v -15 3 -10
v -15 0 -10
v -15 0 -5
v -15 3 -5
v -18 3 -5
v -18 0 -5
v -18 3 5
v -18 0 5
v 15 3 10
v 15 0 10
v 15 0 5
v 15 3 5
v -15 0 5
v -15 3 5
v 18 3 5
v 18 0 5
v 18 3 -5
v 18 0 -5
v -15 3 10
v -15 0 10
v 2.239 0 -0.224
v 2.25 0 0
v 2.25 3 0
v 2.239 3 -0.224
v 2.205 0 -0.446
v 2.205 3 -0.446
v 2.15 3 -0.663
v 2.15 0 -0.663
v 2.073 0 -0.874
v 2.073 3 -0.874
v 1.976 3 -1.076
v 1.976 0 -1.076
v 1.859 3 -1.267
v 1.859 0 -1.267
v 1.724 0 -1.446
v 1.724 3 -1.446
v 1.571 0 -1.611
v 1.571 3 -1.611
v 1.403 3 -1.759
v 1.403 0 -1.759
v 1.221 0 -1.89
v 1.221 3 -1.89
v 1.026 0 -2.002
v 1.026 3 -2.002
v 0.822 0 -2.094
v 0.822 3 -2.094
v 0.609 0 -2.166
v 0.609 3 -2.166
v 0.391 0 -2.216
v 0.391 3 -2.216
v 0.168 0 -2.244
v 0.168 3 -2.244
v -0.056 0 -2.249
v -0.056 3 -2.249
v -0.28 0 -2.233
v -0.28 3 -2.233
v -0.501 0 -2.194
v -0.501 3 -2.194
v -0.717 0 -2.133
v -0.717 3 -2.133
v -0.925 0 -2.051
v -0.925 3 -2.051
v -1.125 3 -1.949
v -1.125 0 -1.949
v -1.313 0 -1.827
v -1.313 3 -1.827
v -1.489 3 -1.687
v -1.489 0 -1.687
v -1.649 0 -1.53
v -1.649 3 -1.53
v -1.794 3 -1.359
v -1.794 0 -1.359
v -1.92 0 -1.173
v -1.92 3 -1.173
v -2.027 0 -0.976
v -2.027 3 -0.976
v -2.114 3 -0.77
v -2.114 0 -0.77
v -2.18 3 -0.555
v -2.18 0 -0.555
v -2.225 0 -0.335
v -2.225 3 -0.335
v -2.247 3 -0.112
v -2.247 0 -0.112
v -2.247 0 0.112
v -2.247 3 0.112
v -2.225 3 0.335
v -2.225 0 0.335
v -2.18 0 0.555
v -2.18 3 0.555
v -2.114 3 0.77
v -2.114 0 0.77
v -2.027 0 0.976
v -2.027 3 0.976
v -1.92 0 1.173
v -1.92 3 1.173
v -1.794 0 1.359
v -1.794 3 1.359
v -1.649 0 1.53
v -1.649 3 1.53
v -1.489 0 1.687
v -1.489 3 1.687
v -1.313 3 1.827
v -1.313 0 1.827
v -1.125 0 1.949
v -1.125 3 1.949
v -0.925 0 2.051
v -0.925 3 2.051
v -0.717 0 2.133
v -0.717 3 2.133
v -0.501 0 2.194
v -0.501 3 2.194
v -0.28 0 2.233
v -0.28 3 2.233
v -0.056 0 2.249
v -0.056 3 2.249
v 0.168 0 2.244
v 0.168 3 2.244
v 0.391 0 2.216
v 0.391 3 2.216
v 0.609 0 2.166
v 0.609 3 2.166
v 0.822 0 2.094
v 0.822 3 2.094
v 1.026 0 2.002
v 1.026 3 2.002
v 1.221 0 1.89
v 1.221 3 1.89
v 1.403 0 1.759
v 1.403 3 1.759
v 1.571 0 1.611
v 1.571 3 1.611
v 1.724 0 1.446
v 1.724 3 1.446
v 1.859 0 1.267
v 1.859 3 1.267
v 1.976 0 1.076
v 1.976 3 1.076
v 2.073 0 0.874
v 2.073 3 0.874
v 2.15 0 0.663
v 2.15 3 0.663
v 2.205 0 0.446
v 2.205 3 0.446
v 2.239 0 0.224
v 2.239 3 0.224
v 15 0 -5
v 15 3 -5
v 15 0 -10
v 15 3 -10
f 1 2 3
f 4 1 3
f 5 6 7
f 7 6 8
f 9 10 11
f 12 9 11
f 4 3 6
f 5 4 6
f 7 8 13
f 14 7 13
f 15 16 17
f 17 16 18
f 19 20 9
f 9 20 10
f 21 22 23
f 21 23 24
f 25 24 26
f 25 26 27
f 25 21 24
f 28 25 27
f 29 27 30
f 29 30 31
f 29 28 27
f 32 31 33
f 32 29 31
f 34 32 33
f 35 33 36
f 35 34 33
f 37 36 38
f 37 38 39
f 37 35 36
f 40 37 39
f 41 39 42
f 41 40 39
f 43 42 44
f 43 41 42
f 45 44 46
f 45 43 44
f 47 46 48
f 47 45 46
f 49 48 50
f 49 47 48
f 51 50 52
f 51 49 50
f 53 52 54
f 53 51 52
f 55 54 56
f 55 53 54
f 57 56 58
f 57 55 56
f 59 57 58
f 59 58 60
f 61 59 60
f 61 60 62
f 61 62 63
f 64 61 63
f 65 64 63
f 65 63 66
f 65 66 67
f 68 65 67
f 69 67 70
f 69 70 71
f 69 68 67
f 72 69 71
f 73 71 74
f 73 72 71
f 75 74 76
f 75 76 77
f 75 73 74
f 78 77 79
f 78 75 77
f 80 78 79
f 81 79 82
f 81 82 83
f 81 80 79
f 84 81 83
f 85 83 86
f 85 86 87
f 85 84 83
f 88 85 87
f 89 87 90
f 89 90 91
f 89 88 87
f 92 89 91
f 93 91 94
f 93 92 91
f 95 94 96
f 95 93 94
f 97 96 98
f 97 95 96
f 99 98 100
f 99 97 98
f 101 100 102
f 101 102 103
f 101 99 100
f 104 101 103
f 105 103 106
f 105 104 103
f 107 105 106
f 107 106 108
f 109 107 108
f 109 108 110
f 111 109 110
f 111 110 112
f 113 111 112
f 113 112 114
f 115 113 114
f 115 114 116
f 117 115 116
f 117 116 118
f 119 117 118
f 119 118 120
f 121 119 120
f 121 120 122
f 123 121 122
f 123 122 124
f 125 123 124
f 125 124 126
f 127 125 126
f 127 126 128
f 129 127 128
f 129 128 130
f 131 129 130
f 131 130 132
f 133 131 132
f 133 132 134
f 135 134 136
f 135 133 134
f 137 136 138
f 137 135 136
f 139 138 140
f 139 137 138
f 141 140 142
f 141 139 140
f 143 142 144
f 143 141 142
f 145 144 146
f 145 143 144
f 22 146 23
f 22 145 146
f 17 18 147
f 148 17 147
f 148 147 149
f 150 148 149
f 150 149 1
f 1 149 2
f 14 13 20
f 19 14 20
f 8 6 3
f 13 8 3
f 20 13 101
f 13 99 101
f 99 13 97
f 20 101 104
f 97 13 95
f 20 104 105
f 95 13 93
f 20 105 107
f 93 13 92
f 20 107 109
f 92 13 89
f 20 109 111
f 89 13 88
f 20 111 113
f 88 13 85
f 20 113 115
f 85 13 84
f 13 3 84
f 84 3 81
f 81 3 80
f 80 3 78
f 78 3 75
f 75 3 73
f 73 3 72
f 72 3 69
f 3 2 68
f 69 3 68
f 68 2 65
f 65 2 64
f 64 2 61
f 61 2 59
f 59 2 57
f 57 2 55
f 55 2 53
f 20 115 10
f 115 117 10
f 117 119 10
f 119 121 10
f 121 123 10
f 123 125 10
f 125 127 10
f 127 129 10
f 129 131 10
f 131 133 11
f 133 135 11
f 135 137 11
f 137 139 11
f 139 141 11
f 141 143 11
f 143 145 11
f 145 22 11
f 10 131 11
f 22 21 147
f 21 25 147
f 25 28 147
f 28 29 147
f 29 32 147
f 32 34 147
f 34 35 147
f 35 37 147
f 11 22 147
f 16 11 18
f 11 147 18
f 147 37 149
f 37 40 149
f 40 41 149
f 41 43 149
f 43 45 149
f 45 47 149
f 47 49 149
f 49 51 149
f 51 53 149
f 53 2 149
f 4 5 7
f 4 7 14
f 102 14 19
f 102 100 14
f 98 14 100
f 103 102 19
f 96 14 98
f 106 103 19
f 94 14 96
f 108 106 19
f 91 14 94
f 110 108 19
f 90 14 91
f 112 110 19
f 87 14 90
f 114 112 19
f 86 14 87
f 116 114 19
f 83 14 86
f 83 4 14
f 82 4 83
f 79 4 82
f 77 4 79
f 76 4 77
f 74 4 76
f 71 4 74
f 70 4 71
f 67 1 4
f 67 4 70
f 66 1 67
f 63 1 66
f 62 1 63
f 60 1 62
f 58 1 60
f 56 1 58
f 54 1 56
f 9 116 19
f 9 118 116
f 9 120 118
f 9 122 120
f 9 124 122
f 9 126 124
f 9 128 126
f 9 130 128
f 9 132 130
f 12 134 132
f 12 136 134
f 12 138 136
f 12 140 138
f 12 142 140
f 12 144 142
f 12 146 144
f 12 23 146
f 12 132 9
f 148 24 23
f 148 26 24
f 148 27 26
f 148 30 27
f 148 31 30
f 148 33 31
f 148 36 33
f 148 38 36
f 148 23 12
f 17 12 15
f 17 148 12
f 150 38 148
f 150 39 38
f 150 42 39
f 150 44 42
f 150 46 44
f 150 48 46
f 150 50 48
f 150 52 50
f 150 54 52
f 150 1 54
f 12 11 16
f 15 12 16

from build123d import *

# Parameters (mm, degrees)
SKETCH1_R           = 2.25
BOSS_EXTRUDE1_DEPTH = 3


with BuildPart() as part:
    # Sketch1 → Boss-Extrude1 (new body)
    with BuildSketch(Plane(origin=(0, 0, 0), x_dir=(1, 0, 0), z_dir=(0, 1, 0))):
        Polygon((-15, 10), (-15, 5), (-18, 5), (-18, -5), (-15, -5), (-15, -10), (15, -10), (15, -5), (18, -5), (18, 5), (15, 5), (15, 10), align=None)
        Circle(SKETCH1_R, mode=Mode.SUBTRACT)
    extrude(amount=BOSS_EXTRUDE1_DEPTH)


solid = part.part
